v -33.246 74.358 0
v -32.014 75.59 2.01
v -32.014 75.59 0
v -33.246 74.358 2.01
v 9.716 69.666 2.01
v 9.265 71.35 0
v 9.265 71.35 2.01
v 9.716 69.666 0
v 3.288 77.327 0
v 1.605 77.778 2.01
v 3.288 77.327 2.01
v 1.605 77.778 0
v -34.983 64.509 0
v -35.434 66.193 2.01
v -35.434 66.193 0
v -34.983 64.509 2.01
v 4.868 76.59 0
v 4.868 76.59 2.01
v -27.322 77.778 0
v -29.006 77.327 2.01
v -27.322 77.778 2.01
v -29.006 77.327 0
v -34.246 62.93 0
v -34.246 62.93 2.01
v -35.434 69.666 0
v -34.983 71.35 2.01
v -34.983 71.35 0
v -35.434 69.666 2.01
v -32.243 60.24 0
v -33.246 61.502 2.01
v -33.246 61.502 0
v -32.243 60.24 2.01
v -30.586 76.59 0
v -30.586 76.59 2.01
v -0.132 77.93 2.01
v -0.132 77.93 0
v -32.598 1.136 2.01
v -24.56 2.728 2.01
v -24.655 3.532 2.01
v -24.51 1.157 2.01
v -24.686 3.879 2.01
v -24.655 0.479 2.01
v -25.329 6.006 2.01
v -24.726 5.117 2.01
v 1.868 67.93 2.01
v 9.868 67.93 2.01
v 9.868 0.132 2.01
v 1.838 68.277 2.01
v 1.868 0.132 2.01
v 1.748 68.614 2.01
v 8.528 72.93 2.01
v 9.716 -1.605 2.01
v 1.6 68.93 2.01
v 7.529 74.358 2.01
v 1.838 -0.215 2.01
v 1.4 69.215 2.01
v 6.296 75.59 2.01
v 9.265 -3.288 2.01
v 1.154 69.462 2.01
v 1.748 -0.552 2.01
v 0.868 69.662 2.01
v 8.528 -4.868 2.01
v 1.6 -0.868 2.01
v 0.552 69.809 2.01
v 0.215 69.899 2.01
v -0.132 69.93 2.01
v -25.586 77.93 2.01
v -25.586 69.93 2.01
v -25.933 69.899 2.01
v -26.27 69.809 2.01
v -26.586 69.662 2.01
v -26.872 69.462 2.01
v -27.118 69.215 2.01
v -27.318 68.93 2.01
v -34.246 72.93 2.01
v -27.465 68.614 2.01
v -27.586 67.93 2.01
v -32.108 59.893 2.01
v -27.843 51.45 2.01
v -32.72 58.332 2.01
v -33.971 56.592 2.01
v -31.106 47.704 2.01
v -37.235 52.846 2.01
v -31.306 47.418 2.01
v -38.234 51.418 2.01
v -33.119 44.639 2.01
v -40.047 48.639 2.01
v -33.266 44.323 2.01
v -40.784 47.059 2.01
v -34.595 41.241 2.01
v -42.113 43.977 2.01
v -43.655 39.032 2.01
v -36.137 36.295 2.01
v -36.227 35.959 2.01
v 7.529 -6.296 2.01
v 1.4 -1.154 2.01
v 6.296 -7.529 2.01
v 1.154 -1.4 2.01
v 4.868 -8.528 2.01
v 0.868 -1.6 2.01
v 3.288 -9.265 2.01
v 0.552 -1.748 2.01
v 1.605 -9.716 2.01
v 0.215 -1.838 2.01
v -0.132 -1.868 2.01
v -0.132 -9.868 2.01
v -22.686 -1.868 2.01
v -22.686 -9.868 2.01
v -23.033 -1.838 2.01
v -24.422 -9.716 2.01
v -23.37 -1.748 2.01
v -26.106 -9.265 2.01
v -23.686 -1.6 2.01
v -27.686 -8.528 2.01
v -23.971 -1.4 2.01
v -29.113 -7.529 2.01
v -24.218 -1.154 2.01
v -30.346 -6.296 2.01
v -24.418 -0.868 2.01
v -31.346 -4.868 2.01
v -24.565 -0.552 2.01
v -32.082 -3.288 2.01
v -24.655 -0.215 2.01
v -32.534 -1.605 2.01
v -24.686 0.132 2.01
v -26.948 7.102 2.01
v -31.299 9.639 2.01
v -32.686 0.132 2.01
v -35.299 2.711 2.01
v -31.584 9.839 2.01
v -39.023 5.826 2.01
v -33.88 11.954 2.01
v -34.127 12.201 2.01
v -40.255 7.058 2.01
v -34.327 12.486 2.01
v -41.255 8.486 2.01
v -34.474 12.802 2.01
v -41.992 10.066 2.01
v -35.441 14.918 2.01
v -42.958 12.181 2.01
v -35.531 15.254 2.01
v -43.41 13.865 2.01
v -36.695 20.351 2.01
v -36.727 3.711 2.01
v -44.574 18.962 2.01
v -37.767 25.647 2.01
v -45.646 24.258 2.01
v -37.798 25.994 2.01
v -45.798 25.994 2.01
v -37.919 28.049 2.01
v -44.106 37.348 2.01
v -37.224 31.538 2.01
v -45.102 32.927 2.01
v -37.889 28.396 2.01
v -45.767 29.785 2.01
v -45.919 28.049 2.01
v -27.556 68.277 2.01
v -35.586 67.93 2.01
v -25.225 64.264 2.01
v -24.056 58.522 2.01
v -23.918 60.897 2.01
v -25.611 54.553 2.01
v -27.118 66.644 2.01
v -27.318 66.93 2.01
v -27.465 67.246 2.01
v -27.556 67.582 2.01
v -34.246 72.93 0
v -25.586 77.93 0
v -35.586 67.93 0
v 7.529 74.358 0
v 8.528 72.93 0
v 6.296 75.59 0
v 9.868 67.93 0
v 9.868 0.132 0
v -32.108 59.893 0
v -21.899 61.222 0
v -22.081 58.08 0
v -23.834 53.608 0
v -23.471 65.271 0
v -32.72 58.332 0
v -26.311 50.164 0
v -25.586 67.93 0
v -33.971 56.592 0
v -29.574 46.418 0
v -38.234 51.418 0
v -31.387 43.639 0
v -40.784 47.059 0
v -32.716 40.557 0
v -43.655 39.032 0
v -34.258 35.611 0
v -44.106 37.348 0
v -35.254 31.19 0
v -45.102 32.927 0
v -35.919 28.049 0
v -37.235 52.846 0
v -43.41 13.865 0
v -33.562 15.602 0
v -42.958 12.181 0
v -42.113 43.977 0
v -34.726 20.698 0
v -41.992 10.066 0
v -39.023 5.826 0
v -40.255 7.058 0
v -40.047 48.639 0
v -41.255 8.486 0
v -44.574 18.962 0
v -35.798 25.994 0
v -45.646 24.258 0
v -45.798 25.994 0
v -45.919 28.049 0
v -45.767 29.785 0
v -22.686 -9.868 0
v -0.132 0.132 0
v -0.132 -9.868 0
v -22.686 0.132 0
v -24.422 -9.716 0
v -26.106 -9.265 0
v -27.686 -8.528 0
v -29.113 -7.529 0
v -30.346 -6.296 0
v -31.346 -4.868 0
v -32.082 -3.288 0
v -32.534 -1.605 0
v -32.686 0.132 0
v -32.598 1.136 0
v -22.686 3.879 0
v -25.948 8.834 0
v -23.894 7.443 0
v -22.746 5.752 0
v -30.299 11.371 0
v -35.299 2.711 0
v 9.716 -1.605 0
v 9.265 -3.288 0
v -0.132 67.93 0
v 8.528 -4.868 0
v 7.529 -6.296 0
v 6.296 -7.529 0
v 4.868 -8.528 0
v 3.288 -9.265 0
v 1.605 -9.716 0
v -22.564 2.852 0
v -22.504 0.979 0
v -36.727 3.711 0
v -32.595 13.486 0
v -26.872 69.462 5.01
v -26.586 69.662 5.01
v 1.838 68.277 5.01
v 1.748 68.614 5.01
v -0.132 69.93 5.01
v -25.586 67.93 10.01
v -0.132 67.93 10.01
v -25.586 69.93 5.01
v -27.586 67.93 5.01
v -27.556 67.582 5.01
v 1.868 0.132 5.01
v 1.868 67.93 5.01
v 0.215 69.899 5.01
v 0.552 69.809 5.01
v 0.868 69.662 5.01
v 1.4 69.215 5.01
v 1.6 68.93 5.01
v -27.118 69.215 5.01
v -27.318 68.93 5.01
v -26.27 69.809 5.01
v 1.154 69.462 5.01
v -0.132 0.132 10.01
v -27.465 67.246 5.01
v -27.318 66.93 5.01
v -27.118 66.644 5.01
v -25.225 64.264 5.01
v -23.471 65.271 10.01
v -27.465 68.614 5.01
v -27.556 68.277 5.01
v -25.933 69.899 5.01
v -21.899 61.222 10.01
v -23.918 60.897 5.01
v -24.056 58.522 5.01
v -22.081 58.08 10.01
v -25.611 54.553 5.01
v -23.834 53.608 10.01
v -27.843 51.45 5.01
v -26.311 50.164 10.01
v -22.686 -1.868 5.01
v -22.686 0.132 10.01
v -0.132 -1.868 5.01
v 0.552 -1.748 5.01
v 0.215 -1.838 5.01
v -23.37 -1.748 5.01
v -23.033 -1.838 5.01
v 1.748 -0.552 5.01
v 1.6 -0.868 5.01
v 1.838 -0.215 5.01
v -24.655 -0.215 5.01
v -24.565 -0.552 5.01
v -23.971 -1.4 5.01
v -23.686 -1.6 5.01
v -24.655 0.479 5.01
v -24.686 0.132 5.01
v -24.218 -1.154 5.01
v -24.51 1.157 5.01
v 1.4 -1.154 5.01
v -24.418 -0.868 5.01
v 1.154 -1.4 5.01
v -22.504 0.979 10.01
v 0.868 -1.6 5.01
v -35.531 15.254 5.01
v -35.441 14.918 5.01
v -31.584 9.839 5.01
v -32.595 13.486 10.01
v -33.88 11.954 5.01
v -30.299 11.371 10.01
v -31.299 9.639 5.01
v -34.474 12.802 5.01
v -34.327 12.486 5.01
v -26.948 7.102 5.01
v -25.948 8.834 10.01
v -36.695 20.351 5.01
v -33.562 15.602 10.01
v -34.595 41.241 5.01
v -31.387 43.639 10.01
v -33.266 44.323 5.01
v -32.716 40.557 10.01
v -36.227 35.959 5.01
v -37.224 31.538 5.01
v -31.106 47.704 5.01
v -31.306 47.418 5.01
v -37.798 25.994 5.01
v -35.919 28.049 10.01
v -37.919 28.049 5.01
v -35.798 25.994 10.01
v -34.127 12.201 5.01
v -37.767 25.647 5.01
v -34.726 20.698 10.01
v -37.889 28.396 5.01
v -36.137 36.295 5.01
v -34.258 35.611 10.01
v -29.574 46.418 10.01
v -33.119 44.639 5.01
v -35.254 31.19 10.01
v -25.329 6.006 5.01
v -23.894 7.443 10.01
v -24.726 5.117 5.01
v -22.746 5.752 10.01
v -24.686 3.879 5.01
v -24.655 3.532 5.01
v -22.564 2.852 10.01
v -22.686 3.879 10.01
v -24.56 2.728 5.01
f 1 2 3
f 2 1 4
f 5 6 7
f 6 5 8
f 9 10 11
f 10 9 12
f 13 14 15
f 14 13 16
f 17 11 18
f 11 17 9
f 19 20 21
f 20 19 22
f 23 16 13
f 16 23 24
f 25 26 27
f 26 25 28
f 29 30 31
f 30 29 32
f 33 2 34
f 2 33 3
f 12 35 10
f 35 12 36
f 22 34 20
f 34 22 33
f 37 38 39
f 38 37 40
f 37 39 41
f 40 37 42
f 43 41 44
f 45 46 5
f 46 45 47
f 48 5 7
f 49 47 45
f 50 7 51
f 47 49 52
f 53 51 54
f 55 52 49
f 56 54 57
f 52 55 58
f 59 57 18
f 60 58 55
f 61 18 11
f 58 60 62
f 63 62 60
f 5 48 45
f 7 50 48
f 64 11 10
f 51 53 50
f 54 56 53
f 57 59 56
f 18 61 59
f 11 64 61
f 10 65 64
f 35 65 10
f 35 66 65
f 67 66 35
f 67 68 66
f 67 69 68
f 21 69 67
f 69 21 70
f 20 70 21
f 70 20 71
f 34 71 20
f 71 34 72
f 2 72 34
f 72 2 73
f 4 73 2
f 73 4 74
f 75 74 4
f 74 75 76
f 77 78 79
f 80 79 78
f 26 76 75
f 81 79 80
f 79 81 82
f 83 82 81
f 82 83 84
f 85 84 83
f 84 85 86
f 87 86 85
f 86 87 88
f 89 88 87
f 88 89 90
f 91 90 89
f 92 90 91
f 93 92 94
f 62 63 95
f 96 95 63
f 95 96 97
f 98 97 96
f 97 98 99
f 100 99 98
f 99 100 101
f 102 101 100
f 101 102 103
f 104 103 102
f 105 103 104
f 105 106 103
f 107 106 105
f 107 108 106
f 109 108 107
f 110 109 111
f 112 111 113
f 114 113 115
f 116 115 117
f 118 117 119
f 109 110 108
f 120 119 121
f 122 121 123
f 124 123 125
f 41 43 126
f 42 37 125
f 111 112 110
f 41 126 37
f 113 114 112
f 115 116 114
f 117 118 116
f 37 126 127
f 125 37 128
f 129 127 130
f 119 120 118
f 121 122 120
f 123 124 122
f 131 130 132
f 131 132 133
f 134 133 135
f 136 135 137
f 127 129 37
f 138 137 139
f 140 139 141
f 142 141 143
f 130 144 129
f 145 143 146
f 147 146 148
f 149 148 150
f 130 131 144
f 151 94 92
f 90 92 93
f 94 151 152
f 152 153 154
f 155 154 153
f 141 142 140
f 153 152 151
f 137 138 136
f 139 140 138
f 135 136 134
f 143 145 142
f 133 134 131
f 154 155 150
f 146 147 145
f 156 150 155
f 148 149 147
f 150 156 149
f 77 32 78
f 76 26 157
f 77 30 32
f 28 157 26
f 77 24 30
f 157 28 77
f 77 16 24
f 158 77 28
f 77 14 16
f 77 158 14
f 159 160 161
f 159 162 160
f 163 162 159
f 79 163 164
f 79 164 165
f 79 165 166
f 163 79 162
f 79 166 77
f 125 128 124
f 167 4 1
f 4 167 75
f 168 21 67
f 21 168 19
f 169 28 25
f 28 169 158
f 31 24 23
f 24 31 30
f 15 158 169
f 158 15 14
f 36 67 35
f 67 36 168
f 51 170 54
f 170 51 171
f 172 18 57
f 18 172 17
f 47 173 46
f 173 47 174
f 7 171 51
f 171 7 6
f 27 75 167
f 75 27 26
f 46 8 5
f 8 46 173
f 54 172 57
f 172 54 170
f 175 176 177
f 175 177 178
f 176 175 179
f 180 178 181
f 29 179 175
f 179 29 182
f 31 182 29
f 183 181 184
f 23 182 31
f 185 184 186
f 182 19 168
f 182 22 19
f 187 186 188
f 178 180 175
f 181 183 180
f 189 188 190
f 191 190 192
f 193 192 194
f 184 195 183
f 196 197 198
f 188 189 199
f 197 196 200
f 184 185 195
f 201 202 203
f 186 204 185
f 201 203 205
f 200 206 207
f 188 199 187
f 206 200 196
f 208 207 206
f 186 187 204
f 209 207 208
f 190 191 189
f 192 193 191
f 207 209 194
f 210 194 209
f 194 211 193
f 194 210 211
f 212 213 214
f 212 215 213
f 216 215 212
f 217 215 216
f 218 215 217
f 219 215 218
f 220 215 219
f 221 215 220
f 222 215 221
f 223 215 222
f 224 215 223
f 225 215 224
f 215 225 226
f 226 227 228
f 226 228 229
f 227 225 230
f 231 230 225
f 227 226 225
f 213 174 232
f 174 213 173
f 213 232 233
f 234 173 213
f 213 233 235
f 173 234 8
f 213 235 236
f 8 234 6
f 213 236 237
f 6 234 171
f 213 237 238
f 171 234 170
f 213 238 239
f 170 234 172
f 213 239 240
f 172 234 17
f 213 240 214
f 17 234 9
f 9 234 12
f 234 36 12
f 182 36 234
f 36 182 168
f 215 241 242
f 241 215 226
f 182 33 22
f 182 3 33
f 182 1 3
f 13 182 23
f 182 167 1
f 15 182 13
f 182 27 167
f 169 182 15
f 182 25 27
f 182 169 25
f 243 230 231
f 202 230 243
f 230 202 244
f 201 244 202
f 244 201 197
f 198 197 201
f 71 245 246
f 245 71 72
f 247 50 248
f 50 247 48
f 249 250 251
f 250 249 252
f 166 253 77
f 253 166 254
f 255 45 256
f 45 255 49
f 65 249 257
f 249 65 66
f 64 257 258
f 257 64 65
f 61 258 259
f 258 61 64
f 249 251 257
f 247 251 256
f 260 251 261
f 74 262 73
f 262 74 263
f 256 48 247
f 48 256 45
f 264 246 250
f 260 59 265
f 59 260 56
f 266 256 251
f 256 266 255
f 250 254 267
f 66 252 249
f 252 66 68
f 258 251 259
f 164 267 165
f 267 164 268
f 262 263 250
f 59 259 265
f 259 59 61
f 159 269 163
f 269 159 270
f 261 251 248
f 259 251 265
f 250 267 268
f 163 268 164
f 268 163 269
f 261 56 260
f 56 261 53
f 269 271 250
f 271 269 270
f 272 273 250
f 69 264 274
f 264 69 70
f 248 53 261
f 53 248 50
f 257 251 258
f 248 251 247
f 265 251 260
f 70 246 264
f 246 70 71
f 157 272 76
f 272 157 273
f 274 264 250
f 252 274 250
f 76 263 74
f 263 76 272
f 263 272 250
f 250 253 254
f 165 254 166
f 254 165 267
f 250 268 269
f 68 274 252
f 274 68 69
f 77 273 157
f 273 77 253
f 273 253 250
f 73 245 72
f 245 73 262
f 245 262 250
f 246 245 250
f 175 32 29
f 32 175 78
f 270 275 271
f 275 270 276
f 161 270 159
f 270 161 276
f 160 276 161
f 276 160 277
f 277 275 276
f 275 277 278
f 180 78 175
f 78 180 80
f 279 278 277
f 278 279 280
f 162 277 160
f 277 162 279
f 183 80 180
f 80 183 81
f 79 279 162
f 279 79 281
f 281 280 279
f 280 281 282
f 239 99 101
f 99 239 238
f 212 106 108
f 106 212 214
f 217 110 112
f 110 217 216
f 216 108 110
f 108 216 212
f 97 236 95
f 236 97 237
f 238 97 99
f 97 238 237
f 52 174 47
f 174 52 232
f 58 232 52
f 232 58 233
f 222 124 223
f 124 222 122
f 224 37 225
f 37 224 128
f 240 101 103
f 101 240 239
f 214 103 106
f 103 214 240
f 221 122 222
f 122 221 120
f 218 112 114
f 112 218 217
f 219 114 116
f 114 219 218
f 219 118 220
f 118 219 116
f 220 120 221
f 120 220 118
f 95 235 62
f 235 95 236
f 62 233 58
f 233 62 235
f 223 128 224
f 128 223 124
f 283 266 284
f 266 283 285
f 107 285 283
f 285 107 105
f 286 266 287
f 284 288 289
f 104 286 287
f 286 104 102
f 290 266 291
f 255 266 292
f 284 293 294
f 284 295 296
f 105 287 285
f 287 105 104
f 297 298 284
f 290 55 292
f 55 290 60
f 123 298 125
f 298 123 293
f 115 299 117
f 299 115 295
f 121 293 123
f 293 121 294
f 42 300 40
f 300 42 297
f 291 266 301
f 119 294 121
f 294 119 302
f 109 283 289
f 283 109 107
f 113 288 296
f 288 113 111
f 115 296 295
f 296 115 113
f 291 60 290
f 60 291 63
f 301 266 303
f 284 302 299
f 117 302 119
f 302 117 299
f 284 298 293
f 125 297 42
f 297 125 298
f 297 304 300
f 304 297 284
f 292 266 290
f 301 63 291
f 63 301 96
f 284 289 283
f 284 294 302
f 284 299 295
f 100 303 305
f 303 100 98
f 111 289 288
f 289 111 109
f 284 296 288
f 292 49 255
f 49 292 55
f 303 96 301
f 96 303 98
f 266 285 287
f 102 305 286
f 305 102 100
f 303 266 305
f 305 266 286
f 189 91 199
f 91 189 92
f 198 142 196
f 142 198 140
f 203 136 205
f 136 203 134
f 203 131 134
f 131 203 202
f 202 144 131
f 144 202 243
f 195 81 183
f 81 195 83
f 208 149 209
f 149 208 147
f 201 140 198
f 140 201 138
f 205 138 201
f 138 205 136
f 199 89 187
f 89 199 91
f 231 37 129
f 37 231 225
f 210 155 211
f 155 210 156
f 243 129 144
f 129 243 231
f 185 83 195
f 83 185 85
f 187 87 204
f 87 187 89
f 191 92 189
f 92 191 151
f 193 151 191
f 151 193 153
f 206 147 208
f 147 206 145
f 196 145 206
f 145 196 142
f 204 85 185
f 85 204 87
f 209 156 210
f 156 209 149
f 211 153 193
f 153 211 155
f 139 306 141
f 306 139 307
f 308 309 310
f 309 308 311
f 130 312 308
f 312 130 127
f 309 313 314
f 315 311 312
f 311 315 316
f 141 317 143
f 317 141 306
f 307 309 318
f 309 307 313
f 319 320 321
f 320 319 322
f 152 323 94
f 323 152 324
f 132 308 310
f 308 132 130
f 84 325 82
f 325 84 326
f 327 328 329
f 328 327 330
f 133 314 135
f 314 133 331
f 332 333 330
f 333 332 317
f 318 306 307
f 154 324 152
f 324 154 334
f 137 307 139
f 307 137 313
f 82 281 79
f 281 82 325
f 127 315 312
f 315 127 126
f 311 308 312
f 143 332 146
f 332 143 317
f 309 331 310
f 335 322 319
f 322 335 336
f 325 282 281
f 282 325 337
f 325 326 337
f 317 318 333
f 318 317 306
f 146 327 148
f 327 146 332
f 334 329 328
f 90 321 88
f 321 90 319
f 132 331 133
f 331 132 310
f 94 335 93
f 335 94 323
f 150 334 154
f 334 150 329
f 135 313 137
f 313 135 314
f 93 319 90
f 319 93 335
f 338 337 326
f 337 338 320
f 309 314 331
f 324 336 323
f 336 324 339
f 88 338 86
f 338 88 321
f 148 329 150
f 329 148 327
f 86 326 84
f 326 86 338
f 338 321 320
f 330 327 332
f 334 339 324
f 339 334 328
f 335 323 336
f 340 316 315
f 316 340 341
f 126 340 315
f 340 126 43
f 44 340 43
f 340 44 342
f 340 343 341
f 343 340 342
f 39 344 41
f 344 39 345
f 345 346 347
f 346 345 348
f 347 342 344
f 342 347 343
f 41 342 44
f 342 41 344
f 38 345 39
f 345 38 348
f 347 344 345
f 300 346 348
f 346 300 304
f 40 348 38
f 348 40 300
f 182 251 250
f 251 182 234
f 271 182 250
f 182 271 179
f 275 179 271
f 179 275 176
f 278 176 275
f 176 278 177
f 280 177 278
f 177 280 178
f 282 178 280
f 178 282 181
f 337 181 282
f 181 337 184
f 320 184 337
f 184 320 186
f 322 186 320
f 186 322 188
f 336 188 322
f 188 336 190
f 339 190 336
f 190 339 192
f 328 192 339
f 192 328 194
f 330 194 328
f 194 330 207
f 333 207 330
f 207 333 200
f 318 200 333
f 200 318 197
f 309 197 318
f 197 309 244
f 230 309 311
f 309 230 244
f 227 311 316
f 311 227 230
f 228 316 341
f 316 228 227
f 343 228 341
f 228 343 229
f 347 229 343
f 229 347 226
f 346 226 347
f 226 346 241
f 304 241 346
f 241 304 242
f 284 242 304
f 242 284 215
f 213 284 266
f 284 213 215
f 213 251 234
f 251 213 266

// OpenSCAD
/*
 * Copyright ©2015 Laurence Gonsalves <laurence@xenomachina.com>
 *
 * This library is free software; you can redistribute it and/or
 * modify it under the terms of the GNU Lesser General Public
 * License as published by the Free Software Foundation; either
 * version 2.1 of the License, or any later version.
 *
 * This library is distributed in the hope that it will be useful,
 * but WITHOUT ANY WARRANTY; without even the implied warranty of
 * MERCHANTABILITY or FITNESS FOR A PARTICULAR PURPOSE.  See the GNU
 * Lesser General Public License for more details.
 *
 * You should have received a copy of the GNU Lesser General Public
 * License along with this library; if not, write to:
 *   Free Software Foundation, Inc.
 *   51 Franklin Street, Fifth Floor
 *   Boston, MA  02110-1301
 *   USA
 */

// Turns a (dxf) 2D outline into a cookie cutter. The model is intentionally
// "upside-down", as this completely eliminates overhangs, making for a really
// easy print.

// To create a dxf file with Inkscape that works in OpenSCAD:
// - create a closed path
// - go to Extensions / Modify Path / Flatten Beziers..., adjust settings and
//   apply
// - select all nodes with the node tool and "Make selected segments lines"
// - Save as filetype "Desktop cutting plotter (AutoCAD DXF R14) (*.dxf)" and
//   enable "us LWPOLYLINE"

$fn=36;

// Full height of cookie cutter.
HEIGHT = 10;

// Rim around top for grip and stability.
RIM_HEIGHT = 2;
RIM_WIDTH = 10;

// The blade actually does the cutting.
BLADE_THICKNESS = 2;

// The bevel is what makes the blade sharp(ish).
BEVEL_HEIGHT = HEIGHT / 2;
BEVEL_STEPS = 10;

module blade() {
    union() {
        translate([0,0,HEIGHT - BEVEL_HEIGHT])cylinder(h=BEVEL_HEIGHT, r1=BLADE_THICKNESS, r2=0);
        cylinder(h=HEIGHT - BEVEL_HEIGHT, r1=BLADE_THICKNESS, r2=BLADE_THICKNESS);
        cylinder(h=RIM_HEIGHT, r1=RIM_WIDTH, r2=RIM_WIDTH);
    }
}

module outline() {
    mirror() import(file="drawing.dxf");
}

module offset_outline(r){
    offset(delta=r, r=r) outline();
}

EPSILON = 0.01;

module main() {
    difference(){
        minkowski(){
            linear_extrude(EPSILON) outline();
            blade();
        }

        // cut-out interior
        linear_extrude(HEIGHT + EPSILON) outline();
    }
}

main();
